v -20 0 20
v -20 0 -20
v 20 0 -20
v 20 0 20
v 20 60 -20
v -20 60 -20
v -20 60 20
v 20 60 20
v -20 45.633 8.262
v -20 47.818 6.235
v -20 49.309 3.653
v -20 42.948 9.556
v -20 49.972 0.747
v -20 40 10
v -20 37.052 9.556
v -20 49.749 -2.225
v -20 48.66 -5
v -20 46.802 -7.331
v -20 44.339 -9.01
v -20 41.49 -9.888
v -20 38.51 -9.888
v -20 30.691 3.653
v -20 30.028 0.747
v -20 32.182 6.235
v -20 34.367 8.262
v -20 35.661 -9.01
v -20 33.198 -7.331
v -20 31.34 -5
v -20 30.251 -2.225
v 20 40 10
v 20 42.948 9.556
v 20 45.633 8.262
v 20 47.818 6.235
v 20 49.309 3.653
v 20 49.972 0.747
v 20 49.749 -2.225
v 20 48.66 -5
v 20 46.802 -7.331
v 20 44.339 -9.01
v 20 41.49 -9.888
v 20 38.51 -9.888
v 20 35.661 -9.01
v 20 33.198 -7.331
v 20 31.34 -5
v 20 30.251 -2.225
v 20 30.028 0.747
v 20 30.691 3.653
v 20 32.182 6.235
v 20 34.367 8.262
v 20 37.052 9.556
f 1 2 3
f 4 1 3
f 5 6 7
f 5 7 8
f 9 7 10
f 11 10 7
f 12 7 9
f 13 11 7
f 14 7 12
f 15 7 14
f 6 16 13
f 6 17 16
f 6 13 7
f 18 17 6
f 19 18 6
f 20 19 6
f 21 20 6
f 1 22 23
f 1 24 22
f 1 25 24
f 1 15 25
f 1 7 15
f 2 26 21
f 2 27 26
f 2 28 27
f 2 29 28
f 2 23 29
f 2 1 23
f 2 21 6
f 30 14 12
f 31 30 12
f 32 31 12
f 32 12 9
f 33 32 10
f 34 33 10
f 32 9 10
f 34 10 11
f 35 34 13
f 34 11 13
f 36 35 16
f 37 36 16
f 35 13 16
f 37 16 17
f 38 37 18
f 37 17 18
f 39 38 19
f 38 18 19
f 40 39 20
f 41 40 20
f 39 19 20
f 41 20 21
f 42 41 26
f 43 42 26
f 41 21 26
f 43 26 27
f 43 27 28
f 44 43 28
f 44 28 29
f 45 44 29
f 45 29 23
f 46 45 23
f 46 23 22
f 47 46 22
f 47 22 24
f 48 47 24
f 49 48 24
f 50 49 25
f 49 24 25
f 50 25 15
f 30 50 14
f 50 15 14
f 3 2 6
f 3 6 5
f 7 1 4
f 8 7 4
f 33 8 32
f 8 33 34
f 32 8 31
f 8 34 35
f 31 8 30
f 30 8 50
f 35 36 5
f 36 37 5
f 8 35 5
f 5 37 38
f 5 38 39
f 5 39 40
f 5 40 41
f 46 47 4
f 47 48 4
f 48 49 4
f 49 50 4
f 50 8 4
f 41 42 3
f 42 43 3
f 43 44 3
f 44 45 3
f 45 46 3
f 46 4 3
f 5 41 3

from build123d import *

# Parameters (mm, degrees)
SKETCH1_W           = 40
SKETCH1_H           = 40
BOSS_EXTRUDE1_DEPTH = 60
SKETCH2_R           = 10
CUT_EXTRUDE1_DEPTH  = 40


with BuildPart() as part:
    # Sketch1 → Boss-Extrude1 (new body)
    with BuildSketch(Plane(origin=(0, 0, 0), x_dir=(1, 0, 0), z_dir=(0, 1, 0))):
        Rectangle(SKETCH1_W, SKETCH1_H)
    extrude(amount=BOSS_EXTRUDE1_DEPTH)

    # Sketch2 → Cut-Extrude1 (cut)
    with BuildSketch(Plane.ZY.offset(20)):
        with Locations((0, 40)):
            Circle(SKETCH2_R)
    extrude(amount=-CUT_EXTRUDE1_DEPTH, mode=Mode.SUBTRACT)


solid = part.part
